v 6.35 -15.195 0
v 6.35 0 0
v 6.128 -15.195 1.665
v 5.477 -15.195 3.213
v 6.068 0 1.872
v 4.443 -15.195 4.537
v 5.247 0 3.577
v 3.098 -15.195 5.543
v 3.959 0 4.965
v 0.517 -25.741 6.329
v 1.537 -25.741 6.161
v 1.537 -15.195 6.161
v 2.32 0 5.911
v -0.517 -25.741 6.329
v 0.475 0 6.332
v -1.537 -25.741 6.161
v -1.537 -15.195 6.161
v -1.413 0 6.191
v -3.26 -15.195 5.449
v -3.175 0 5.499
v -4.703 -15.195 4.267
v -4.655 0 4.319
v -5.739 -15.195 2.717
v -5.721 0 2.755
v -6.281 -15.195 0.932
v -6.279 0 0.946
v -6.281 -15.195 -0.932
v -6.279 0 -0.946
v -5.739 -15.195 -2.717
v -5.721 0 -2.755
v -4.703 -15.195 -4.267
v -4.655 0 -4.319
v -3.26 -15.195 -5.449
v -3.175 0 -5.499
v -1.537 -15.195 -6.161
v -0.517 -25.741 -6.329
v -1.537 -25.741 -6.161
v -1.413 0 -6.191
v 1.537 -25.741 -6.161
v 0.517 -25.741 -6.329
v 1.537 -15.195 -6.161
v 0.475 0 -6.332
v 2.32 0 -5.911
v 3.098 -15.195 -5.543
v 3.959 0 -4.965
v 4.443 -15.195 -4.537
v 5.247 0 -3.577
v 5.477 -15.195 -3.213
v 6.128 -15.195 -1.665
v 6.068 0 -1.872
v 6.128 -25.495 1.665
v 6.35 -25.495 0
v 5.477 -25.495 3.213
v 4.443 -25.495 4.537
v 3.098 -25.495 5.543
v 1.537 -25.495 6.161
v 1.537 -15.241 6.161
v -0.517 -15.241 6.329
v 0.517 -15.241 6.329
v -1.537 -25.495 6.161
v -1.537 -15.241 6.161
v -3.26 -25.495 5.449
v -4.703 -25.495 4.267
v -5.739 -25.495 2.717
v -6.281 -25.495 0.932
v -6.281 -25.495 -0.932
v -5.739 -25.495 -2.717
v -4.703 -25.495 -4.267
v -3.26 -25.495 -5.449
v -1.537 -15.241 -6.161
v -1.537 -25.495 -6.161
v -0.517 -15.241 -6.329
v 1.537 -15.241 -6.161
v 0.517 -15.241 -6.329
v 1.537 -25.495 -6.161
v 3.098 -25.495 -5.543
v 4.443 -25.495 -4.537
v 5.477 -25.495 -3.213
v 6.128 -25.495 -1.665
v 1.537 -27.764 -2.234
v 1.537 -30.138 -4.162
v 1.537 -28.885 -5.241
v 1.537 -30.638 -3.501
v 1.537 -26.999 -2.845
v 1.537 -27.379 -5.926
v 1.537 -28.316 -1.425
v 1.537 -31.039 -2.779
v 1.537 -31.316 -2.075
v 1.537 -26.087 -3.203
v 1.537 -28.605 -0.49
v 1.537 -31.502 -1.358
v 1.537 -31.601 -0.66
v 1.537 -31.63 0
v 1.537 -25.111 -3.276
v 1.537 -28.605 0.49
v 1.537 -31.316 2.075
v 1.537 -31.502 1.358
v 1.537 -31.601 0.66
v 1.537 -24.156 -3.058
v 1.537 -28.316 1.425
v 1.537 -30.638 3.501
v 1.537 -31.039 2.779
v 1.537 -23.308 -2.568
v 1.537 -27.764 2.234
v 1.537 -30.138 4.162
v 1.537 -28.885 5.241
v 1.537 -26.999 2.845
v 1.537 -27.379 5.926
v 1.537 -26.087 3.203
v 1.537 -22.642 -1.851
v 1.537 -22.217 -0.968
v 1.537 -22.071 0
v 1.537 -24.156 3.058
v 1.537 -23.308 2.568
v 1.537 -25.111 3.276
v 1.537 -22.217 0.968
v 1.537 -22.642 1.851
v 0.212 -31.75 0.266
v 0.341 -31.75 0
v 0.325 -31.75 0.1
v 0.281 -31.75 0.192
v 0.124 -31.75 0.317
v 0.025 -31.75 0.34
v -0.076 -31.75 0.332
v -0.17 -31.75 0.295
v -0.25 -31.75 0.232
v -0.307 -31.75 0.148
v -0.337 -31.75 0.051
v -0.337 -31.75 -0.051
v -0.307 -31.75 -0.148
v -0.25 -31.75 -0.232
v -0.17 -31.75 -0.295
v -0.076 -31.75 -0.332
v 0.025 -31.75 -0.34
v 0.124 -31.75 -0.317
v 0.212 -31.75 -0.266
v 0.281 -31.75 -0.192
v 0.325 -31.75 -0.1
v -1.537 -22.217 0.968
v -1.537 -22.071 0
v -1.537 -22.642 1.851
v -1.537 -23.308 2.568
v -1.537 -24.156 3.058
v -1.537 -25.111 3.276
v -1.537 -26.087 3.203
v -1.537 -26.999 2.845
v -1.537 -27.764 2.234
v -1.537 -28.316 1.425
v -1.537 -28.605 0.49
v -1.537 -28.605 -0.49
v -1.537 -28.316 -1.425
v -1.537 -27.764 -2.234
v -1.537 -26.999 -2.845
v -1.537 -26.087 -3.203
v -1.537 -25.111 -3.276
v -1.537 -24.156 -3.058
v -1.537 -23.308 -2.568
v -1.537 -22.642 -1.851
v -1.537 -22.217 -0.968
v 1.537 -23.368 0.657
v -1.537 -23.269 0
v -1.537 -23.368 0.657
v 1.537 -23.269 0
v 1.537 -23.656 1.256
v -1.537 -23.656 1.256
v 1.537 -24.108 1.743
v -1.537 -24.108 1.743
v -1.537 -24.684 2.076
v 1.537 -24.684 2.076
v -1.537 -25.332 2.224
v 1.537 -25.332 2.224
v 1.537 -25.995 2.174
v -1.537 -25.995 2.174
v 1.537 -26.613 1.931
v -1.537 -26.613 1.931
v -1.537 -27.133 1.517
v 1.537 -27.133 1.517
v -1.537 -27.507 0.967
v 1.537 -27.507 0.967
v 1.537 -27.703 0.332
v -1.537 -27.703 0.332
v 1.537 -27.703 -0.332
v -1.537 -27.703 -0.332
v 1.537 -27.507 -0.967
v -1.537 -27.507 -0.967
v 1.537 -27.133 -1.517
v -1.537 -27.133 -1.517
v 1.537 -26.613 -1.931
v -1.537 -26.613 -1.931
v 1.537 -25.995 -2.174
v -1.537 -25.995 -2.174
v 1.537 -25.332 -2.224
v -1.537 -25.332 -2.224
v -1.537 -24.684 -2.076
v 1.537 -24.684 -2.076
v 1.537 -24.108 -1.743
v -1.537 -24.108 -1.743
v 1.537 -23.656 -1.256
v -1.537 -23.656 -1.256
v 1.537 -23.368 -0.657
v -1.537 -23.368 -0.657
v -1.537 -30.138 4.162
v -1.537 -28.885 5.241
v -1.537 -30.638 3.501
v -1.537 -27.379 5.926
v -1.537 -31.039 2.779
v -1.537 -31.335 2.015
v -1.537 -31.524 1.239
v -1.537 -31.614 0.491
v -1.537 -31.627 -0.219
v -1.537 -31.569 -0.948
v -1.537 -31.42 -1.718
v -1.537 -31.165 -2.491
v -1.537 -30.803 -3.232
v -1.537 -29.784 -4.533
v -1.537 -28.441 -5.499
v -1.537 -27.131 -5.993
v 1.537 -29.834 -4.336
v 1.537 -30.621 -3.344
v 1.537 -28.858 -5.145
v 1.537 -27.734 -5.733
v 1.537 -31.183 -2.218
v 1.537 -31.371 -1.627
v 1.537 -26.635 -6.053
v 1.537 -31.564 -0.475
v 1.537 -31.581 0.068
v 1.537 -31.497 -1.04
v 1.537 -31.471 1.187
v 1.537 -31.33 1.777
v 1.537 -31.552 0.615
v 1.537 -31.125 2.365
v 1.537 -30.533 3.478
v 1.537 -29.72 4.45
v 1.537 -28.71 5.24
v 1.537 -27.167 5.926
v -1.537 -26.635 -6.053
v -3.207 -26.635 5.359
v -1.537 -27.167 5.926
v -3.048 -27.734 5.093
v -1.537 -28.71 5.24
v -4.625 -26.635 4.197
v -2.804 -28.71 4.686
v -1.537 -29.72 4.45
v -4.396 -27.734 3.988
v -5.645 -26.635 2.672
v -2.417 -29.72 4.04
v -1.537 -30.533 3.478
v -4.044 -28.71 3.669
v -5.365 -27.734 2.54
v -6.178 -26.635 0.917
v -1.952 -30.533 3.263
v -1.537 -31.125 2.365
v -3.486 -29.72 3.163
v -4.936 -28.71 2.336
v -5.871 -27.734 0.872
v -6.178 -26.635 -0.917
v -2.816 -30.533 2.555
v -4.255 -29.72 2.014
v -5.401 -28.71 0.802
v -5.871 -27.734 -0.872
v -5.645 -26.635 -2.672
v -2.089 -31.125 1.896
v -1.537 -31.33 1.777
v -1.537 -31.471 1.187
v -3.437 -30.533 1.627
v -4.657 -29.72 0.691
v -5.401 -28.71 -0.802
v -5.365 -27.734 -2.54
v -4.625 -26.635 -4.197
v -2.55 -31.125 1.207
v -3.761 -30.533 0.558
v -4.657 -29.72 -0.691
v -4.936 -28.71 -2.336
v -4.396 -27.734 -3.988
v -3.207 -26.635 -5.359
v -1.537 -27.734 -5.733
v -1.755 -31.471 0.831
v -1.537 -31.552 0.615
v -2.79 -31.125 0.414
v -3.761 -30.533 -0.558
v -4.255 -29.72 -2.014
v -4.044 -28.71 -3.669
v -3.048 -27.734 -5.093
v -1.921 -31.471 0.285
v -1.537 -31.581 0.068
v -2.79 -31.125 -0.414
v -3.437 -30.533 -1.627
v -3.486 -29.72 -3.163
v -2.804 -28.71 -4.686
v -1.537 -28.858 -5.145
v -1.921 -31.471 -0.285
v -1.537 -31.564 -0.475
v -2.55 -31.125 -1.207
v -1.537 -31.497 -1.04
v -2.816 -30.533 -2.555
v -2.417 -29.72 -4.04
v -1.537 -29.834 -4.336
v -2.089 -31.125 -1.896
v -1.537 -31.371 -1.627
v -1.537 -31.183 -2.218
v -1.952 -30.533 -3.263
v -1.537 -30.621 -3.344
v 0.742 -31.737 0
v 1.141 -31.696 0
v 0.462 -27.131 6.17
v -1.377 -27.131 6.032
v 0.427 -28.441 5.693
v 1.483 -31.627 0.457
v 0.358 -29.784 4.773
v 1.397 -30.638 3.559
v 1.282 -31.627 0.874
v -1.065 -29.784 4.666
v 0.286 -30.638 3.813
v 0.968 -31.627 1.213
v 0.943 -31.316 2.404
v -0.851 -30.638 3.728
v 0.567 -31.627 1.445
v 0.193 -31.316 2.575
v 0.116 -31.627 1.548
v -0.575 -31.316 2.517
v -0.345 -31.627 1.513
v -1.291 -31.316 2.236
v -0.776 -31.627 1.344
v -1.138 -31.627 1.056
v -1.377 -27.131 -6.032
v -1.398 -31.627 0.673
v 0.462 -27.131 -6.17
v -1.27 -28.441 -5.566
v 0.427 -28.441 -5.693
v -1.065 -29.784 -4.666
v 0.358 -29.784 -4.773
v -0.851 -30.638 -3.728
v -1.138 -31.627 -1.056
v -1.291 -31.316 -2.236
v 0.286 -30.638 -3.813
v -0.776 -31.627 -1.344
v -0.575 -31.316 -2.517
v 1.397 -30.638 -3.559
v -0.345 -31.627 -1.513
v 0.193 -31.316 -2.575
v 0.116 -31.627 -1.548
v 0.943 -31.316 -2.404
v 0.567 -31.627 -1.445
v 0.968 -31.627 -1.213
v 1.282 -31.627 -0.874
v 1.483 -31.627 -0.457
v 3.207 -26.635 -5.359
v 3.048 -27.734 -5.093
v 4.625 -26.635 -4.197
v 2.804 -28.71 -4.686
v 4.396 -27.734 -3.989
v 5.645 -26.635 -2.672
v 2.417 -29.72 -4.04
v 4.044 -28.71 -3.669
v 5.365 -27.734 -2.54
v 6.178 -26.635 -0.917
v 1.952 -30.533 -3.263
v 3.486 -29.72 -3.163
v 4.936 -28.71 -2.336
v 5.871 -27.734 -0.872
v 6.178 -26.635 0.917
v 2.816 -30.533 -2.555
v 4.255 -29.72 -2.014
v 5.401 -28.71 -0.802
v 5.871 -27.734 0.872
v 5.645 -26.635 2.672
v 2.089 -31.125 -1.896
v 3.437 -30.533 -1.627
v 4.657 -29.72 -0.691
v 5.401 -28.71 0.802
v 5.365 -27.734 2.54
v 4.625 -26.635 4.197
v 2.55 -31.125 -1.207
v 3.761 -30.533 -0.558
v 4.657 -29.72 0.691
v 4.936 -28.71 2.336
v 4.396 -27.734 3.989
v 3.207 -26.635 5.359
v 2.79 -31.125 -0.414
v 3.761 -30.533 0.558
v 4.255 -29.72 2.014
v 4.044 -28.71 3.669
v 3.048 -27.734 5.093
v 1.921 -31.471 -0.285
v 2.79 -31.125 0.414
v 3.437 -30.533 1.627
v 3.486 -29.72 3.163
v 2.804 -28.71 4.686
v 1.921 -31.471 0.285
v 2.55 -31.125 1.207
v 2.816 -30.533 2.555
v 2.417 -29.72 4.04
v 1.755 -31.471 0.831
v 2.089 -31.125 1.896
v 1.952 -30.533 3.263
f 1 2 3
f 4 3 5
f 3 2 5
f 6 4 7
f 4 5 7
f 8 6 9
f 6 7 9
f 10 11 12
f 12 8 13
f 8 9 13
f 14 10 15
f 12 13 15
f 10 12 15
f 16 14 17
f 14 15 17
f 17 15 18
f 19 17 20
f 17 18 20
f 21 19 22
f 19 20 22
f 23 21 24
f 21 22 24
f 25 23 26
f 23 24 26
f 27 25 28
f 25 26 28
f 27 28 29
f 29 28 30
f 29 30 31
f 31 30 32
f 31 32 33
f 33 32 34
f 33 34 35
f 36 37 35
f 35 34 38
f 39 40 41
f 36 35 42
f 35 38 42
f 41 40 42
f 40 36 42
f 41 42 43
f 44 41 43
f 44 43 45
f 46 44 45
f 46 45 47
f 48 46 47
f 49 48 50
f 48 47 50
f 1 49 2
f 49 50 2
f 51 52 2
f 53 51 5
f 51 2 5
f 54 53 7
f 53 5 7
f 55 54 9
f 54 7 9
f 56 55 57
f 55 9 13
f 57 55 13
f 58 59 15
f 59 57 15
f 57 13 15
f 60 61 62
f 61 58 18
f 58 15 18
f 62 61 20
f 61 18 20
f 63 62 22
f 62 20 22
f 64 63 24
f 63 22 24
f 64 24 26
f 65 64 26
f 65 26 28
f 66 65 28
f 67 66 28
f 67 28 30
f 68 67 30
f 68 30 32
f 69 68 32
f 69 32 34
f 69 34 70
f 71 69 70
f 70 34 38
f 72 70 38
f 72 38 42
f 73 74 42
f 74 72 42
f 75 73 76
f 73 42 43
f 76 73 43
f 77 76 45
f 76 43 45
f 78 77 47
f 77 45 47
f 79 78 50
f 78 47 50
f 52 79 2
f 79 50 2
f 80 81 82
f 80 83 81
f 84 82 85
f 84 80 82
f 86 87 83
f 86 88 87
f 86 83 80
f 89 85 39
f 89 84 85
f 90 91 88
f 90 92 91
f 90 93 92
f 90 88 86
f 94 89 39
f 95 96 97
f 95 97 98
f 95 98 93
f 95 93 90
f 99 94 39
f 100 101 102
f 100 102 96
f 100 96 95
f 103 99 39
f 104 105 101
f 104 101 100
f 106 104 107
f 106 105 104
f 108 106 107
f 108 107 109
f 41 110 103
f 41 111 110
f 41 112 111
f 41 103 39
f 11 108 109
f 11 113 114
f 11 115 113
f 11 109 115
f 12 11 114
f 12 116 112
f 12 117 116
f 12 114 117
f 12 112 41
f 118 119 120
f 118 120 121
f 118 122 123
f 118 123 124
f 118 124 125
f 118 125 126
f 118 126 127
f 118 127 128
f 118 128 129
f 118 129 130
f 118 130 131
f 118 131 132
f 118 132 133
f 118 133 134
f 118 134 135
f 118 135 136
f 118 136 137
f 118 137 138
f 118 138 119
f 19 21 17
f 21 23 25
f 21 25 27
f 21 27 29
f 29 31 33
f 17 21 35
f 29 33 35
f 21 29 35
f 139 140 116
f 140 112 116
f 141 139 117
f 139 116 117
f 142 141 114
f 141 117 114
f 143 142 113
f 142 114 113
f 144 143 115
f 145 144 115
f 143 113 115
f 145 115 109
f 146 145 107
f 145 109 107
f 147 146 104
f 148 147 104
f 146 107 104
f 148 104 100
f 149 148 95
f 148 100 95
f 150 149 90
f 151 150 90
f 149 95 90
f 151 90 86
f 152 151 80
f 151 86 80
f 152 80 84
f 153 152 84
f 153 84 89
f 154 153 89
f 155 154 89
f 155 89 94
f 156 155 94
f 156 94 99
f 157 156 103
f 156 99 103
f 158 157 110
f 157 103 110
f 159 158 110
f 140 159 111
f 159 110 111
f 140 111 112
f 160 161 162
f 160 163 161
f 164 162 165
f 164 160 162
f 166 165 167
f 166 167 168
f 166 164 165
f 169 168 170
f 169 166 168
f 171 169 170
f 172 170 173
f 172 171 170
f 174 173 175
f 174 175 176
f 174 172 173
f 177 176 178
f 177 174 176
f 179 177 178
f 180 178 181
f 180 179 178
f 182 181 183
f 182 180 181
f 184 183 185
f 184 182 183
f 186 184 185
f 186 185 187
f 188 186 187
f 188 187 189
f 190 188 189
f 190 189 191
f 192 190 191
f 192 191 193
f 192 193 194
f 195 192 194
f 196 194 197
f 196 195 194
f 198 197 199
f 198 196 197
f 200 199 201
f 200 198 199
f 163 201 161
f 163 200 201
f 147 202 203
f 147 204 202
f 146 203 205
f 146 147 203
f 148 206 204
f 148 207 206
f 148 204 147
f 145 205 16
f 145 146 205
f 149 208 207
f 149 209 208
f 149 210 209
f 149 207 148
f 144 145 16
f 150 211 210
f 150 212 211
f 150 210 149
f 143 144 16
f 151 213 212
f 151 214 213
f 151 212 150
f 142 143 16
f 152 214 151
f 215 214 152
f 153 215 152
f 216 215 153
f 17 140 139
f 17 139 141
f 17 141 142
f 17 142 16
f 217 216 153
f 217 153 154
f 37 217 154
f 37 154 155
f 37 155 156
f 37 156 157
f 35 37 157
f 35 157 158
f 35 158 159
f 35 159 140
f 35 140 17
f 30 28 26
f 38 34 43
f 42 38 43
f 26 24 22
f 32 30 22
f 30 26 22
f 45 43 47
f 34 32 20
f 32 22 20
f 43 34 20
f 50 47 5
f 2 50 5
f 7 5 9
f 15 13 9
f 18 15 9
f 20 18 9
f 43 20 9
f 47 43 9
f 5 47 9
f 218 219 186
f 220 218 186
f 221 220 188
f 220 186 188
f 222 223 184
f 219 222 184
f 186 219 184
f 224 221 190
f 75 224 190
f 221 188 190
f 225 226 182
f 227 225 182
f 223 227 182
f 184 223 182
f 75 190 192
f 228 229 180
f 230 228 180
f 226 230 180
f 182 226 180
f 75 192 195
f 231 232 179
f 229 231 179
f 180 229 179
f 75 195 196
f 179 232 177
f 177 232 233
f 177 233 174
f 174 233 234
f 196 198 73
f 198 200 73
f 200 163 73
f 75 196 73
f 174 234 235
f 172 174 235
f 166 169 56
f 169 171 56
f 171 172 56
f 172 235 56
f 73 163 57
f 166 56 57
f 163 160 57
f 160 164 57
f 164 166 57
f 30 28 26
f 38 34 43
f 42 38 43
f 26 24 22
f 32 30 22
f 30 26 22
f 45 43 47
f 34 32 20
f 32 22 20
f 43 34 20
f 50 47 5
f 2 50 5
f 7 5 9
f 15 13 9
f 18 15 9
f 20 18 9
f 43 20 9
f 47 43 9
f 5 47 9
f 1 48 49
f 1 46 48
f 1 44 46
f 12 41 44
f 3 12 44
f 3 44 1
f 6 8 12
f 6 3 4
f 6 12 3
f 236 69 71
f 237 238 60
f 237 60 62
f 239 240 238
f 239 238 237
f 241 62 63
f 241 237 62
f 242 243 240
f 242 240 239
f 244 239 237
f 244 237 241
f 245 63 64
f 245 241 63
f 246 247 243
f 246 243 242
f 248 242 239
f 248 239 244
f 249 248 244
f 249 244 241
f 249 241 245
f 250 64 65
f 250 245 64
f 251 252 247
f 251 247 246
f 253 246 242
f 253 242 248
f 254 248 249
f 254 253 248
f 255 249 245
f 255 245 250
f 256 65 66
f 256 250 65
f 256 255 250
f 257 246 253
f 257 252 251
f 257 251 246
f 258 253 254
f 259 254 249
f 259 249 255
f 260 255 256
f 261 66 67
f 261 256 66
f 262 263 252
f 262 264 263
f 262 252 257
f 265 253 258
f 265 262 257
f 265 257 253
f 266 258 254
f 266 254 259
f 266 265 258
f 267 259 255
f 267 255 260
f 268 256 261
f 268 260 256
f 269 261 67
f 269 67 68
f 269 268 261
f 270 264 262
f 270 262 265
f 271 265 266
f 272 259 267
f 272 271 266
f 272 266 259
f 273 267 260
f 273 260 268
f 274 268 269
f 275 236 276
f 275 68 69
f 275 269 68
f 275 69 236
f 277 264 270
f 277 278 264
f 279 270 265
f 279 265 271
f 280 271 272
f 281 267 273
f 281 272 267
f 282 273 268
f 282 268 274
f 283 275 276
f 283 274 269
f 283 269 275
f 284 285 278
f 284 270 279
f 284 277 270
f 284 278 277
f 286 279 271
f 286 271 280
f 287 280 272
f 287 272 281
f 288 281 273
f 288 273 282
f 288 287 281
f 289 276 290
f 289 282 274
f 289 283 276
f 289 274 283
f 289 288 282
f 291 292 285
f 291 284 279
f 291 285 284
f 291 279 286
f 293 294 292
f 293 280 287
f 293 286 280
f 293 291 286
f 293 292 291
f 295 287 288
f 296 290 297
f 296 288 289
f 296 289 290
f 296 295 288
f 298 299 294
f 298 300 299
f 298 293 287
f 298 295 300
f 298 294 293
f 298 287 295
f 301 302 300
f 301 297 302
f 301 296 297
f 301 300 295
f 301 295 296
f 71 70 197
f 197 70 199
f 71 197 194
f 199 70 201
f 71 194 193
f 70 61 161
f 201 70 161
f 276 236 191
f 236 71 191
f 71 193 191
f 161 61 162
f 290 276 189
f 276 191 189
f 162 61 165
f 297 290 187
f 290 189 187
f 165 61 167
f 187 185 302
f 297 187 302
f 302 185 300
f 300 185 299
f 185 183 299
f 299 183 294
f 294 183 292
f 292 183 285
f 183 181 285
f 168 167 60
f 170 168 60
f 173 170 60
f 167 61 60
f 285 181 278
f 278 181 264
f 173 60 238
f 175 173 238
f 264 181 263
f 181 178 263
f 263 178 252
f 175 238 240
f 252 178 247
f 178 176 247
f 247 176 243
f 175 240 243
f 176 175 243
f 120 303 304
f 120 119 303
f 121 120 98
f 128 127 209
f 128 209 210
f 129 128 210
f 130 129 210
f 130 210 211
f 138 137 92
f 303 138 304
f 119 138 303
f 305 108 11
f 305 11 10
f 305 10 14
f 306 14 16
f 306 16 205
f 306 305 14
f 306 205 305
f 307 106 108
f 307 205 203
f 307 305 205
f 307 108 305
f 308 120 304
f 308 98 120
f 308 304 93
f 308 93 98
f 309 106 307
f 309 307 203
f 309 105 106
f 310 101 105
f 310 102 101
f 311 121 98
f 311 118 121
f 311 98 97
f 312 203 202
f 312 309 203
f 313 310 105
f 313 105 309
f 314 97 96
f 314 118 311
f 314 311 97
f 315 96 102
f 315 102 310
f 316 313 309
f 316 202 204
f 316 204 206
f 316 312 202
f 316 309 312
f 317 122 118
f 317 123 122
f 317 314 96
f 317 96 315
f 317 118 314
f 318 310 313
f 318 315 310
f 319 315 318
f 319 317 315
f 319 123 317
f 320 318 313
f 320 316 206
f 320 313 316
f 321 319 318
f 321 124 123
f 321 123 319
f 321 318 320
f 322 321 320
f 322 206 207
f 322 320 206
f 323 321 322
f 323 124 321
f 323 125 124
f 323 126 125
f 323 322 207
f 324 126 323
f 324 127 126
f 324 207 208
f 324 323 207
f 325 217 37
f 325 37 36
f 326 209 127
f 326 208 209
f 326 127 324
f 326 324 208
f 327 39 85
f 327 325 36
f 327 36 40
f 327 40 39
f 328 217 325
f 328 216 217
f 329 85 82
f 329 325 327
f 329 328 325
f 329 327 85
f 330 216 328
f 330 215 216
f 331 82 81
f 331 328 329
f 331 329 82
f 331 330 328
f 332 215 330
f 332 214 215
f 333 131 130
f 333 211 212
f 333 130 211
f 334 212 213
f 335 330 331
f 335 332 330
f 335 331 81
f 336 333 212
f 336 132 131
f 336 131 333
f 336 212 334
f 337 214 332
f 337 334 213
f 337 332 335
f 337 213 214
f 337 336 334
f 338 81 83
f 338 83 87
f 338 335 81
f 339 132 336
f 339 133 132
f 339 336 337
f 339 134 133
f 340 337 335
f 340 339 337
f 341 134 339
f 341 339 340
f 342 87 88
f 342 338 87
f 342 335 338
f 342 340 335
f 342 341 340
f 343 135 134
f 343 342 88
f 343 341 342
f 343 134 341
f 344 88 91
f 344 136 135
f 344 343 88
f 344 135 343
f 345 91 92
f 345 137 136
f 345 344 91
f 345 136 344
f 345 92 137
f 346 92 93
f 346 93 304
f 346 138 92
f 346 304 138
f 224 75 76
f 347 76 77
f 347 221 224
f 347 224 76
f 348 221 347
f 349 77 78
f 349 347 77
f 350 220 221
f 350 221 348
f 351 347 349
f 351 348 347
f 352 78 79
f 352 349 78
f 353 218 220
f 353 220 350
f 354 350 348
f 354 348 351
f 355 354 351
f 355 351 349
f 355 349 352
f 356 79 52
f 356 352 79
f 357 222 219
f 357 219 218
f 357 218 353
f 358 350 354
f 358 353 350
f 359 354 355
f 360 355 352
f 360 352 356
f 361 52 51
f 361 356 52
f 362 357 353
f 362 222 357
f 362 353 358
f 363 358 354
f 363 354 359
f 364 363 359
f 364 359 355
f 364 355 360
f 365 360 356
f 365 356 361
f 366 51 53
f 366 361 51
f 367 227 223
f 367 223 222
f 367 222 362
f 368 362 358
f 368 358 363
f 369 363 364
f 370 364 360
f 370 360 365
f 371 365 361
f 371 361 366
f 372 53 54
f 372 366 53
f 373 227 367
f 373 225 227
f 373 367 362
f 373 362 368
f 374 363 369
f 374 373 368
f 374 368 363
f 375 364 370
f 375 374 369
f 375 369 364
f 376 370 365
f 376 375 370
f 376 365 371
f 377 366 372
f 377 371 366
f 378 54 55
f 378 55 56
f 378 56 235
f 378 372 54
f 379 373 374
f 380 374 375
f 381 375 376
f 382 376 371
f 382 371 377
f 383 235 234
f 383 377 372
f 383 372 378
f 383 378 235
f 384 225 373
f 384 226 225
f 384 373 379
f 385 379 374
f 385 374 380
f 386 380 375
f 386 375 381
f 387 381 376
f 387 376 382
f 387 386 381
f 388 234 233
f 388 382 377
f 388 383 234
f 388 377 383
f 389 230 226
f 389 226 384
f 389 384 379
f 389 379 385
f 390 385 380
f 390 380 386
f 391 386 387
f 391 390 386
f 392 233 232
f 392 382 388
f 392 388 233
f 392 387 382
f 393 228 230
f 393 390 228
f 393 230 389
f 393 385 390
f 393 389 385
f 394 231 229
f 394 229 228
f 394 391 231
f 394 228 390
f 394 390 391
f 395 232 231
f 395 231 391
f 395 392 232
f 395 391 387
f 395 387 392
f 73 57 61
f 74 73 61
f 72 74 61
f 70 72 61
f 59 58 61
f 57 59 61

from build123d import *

# Parameters (mm, degrees)
F0_R      = 6.35
F1_DEPTH  = 31.75
F2_R      = 6.2547444974
F3_W      = 1.5368231577
F3_H      = 10.16
F4_DEPTH  = 23.1394
F5_R      = 2.2298122128
F6_DEPTH  = 2.5146
F8_DEPTH  = 31.75
F9_R      = 6.0094603995
F7_W      = 7.8039629152
F7_H      = 20.3567193821
F10_DEPTH = 12.7
F11_R     = 3.2850641109
F12_DEPTH = 19.2278


# Not quite as in the source:
# - a feature names something its author has since deleted; it is built from what else it names


with BuildPart() as f1:
    # F0 (on Front) → F1 (new body)
    with BuildSketch(Plane.XZ):
        Circle(F0_R)
    extrude(amount=F1_DEPTH)

    # F2
    f2_edges = [f1.edges().sort_by_distance(p)[0] for p in [
        (-6.35, -31.75, 0),
    ]]
    fillet(f2_edges, radius=F2_R)

    # F3 (on Top) → F4 (cut, symmetric)
    with BuildSketch(Plane.XY):
        with Locations((-0.7684115789, -30.4810036588)):
            Rectangle(F3_W, F3_H)
        with Locations((0.7684115789, -30.4810036588)):
            Rectangle(F3_W, F3_H)
        with Locations((0.7684115789, -20.3210036588)):
            Rectangle(F3_W, F3_H)
        with Locations((-0.7684115789, -20.3210036588)):
            Rectangle(F3_W, F3_H)
    extrude(amount=F4_DEPTH, both=True, mode=Mode.SUBTRACT)

    # F5 (on Right) → F6 (join, symmetric)
    with BuildSketch(Plane.YZ):
        with Locations((-25.498393923, 0)):
            Circle(F5_R)
    extrude(amount=F6_DEPTH, both=True)


with BuildPart() as f8:
    # F0 (on Front) → F8 (new body)
    with BuildSketch(Plane.XZ):
        Circle(F0_R)
    extrude(amount=F8_DEPTH)

    # F9
    f9_edges = [f8.edges().sort_by_distance(p)[0] for p in [
        (-6.35, -31.75, 0),
    ]]
    fillet(f9_edges, radius=F9_R)

    # F7 (on Top) → F10 (cut, symmetric)
    with BuildSketch(Plane.XY):
        with Locations((-5.43864473, -25.3729536198)):
            Rectangle(F7_W, F7_H)
        with Locations((5.43864473, -25.3729536198)):
            Rectangle(F7_W, F7_H)
    extrude(amount=F10_DEPTH, both=True, mode=Mode.SUBTRACT)

    # F11 (on Right) → F12 (cut, symmetric)
    with BuildSketch(Plane.YZ):
        with Locations((-25.3563765436, 0)):
            Circle(F11_R)
    extrude(amount=F12_DEPTH, both=True, mode=Mode.SUBTRACT)


solid = Compound([f1.part, f8.part])
